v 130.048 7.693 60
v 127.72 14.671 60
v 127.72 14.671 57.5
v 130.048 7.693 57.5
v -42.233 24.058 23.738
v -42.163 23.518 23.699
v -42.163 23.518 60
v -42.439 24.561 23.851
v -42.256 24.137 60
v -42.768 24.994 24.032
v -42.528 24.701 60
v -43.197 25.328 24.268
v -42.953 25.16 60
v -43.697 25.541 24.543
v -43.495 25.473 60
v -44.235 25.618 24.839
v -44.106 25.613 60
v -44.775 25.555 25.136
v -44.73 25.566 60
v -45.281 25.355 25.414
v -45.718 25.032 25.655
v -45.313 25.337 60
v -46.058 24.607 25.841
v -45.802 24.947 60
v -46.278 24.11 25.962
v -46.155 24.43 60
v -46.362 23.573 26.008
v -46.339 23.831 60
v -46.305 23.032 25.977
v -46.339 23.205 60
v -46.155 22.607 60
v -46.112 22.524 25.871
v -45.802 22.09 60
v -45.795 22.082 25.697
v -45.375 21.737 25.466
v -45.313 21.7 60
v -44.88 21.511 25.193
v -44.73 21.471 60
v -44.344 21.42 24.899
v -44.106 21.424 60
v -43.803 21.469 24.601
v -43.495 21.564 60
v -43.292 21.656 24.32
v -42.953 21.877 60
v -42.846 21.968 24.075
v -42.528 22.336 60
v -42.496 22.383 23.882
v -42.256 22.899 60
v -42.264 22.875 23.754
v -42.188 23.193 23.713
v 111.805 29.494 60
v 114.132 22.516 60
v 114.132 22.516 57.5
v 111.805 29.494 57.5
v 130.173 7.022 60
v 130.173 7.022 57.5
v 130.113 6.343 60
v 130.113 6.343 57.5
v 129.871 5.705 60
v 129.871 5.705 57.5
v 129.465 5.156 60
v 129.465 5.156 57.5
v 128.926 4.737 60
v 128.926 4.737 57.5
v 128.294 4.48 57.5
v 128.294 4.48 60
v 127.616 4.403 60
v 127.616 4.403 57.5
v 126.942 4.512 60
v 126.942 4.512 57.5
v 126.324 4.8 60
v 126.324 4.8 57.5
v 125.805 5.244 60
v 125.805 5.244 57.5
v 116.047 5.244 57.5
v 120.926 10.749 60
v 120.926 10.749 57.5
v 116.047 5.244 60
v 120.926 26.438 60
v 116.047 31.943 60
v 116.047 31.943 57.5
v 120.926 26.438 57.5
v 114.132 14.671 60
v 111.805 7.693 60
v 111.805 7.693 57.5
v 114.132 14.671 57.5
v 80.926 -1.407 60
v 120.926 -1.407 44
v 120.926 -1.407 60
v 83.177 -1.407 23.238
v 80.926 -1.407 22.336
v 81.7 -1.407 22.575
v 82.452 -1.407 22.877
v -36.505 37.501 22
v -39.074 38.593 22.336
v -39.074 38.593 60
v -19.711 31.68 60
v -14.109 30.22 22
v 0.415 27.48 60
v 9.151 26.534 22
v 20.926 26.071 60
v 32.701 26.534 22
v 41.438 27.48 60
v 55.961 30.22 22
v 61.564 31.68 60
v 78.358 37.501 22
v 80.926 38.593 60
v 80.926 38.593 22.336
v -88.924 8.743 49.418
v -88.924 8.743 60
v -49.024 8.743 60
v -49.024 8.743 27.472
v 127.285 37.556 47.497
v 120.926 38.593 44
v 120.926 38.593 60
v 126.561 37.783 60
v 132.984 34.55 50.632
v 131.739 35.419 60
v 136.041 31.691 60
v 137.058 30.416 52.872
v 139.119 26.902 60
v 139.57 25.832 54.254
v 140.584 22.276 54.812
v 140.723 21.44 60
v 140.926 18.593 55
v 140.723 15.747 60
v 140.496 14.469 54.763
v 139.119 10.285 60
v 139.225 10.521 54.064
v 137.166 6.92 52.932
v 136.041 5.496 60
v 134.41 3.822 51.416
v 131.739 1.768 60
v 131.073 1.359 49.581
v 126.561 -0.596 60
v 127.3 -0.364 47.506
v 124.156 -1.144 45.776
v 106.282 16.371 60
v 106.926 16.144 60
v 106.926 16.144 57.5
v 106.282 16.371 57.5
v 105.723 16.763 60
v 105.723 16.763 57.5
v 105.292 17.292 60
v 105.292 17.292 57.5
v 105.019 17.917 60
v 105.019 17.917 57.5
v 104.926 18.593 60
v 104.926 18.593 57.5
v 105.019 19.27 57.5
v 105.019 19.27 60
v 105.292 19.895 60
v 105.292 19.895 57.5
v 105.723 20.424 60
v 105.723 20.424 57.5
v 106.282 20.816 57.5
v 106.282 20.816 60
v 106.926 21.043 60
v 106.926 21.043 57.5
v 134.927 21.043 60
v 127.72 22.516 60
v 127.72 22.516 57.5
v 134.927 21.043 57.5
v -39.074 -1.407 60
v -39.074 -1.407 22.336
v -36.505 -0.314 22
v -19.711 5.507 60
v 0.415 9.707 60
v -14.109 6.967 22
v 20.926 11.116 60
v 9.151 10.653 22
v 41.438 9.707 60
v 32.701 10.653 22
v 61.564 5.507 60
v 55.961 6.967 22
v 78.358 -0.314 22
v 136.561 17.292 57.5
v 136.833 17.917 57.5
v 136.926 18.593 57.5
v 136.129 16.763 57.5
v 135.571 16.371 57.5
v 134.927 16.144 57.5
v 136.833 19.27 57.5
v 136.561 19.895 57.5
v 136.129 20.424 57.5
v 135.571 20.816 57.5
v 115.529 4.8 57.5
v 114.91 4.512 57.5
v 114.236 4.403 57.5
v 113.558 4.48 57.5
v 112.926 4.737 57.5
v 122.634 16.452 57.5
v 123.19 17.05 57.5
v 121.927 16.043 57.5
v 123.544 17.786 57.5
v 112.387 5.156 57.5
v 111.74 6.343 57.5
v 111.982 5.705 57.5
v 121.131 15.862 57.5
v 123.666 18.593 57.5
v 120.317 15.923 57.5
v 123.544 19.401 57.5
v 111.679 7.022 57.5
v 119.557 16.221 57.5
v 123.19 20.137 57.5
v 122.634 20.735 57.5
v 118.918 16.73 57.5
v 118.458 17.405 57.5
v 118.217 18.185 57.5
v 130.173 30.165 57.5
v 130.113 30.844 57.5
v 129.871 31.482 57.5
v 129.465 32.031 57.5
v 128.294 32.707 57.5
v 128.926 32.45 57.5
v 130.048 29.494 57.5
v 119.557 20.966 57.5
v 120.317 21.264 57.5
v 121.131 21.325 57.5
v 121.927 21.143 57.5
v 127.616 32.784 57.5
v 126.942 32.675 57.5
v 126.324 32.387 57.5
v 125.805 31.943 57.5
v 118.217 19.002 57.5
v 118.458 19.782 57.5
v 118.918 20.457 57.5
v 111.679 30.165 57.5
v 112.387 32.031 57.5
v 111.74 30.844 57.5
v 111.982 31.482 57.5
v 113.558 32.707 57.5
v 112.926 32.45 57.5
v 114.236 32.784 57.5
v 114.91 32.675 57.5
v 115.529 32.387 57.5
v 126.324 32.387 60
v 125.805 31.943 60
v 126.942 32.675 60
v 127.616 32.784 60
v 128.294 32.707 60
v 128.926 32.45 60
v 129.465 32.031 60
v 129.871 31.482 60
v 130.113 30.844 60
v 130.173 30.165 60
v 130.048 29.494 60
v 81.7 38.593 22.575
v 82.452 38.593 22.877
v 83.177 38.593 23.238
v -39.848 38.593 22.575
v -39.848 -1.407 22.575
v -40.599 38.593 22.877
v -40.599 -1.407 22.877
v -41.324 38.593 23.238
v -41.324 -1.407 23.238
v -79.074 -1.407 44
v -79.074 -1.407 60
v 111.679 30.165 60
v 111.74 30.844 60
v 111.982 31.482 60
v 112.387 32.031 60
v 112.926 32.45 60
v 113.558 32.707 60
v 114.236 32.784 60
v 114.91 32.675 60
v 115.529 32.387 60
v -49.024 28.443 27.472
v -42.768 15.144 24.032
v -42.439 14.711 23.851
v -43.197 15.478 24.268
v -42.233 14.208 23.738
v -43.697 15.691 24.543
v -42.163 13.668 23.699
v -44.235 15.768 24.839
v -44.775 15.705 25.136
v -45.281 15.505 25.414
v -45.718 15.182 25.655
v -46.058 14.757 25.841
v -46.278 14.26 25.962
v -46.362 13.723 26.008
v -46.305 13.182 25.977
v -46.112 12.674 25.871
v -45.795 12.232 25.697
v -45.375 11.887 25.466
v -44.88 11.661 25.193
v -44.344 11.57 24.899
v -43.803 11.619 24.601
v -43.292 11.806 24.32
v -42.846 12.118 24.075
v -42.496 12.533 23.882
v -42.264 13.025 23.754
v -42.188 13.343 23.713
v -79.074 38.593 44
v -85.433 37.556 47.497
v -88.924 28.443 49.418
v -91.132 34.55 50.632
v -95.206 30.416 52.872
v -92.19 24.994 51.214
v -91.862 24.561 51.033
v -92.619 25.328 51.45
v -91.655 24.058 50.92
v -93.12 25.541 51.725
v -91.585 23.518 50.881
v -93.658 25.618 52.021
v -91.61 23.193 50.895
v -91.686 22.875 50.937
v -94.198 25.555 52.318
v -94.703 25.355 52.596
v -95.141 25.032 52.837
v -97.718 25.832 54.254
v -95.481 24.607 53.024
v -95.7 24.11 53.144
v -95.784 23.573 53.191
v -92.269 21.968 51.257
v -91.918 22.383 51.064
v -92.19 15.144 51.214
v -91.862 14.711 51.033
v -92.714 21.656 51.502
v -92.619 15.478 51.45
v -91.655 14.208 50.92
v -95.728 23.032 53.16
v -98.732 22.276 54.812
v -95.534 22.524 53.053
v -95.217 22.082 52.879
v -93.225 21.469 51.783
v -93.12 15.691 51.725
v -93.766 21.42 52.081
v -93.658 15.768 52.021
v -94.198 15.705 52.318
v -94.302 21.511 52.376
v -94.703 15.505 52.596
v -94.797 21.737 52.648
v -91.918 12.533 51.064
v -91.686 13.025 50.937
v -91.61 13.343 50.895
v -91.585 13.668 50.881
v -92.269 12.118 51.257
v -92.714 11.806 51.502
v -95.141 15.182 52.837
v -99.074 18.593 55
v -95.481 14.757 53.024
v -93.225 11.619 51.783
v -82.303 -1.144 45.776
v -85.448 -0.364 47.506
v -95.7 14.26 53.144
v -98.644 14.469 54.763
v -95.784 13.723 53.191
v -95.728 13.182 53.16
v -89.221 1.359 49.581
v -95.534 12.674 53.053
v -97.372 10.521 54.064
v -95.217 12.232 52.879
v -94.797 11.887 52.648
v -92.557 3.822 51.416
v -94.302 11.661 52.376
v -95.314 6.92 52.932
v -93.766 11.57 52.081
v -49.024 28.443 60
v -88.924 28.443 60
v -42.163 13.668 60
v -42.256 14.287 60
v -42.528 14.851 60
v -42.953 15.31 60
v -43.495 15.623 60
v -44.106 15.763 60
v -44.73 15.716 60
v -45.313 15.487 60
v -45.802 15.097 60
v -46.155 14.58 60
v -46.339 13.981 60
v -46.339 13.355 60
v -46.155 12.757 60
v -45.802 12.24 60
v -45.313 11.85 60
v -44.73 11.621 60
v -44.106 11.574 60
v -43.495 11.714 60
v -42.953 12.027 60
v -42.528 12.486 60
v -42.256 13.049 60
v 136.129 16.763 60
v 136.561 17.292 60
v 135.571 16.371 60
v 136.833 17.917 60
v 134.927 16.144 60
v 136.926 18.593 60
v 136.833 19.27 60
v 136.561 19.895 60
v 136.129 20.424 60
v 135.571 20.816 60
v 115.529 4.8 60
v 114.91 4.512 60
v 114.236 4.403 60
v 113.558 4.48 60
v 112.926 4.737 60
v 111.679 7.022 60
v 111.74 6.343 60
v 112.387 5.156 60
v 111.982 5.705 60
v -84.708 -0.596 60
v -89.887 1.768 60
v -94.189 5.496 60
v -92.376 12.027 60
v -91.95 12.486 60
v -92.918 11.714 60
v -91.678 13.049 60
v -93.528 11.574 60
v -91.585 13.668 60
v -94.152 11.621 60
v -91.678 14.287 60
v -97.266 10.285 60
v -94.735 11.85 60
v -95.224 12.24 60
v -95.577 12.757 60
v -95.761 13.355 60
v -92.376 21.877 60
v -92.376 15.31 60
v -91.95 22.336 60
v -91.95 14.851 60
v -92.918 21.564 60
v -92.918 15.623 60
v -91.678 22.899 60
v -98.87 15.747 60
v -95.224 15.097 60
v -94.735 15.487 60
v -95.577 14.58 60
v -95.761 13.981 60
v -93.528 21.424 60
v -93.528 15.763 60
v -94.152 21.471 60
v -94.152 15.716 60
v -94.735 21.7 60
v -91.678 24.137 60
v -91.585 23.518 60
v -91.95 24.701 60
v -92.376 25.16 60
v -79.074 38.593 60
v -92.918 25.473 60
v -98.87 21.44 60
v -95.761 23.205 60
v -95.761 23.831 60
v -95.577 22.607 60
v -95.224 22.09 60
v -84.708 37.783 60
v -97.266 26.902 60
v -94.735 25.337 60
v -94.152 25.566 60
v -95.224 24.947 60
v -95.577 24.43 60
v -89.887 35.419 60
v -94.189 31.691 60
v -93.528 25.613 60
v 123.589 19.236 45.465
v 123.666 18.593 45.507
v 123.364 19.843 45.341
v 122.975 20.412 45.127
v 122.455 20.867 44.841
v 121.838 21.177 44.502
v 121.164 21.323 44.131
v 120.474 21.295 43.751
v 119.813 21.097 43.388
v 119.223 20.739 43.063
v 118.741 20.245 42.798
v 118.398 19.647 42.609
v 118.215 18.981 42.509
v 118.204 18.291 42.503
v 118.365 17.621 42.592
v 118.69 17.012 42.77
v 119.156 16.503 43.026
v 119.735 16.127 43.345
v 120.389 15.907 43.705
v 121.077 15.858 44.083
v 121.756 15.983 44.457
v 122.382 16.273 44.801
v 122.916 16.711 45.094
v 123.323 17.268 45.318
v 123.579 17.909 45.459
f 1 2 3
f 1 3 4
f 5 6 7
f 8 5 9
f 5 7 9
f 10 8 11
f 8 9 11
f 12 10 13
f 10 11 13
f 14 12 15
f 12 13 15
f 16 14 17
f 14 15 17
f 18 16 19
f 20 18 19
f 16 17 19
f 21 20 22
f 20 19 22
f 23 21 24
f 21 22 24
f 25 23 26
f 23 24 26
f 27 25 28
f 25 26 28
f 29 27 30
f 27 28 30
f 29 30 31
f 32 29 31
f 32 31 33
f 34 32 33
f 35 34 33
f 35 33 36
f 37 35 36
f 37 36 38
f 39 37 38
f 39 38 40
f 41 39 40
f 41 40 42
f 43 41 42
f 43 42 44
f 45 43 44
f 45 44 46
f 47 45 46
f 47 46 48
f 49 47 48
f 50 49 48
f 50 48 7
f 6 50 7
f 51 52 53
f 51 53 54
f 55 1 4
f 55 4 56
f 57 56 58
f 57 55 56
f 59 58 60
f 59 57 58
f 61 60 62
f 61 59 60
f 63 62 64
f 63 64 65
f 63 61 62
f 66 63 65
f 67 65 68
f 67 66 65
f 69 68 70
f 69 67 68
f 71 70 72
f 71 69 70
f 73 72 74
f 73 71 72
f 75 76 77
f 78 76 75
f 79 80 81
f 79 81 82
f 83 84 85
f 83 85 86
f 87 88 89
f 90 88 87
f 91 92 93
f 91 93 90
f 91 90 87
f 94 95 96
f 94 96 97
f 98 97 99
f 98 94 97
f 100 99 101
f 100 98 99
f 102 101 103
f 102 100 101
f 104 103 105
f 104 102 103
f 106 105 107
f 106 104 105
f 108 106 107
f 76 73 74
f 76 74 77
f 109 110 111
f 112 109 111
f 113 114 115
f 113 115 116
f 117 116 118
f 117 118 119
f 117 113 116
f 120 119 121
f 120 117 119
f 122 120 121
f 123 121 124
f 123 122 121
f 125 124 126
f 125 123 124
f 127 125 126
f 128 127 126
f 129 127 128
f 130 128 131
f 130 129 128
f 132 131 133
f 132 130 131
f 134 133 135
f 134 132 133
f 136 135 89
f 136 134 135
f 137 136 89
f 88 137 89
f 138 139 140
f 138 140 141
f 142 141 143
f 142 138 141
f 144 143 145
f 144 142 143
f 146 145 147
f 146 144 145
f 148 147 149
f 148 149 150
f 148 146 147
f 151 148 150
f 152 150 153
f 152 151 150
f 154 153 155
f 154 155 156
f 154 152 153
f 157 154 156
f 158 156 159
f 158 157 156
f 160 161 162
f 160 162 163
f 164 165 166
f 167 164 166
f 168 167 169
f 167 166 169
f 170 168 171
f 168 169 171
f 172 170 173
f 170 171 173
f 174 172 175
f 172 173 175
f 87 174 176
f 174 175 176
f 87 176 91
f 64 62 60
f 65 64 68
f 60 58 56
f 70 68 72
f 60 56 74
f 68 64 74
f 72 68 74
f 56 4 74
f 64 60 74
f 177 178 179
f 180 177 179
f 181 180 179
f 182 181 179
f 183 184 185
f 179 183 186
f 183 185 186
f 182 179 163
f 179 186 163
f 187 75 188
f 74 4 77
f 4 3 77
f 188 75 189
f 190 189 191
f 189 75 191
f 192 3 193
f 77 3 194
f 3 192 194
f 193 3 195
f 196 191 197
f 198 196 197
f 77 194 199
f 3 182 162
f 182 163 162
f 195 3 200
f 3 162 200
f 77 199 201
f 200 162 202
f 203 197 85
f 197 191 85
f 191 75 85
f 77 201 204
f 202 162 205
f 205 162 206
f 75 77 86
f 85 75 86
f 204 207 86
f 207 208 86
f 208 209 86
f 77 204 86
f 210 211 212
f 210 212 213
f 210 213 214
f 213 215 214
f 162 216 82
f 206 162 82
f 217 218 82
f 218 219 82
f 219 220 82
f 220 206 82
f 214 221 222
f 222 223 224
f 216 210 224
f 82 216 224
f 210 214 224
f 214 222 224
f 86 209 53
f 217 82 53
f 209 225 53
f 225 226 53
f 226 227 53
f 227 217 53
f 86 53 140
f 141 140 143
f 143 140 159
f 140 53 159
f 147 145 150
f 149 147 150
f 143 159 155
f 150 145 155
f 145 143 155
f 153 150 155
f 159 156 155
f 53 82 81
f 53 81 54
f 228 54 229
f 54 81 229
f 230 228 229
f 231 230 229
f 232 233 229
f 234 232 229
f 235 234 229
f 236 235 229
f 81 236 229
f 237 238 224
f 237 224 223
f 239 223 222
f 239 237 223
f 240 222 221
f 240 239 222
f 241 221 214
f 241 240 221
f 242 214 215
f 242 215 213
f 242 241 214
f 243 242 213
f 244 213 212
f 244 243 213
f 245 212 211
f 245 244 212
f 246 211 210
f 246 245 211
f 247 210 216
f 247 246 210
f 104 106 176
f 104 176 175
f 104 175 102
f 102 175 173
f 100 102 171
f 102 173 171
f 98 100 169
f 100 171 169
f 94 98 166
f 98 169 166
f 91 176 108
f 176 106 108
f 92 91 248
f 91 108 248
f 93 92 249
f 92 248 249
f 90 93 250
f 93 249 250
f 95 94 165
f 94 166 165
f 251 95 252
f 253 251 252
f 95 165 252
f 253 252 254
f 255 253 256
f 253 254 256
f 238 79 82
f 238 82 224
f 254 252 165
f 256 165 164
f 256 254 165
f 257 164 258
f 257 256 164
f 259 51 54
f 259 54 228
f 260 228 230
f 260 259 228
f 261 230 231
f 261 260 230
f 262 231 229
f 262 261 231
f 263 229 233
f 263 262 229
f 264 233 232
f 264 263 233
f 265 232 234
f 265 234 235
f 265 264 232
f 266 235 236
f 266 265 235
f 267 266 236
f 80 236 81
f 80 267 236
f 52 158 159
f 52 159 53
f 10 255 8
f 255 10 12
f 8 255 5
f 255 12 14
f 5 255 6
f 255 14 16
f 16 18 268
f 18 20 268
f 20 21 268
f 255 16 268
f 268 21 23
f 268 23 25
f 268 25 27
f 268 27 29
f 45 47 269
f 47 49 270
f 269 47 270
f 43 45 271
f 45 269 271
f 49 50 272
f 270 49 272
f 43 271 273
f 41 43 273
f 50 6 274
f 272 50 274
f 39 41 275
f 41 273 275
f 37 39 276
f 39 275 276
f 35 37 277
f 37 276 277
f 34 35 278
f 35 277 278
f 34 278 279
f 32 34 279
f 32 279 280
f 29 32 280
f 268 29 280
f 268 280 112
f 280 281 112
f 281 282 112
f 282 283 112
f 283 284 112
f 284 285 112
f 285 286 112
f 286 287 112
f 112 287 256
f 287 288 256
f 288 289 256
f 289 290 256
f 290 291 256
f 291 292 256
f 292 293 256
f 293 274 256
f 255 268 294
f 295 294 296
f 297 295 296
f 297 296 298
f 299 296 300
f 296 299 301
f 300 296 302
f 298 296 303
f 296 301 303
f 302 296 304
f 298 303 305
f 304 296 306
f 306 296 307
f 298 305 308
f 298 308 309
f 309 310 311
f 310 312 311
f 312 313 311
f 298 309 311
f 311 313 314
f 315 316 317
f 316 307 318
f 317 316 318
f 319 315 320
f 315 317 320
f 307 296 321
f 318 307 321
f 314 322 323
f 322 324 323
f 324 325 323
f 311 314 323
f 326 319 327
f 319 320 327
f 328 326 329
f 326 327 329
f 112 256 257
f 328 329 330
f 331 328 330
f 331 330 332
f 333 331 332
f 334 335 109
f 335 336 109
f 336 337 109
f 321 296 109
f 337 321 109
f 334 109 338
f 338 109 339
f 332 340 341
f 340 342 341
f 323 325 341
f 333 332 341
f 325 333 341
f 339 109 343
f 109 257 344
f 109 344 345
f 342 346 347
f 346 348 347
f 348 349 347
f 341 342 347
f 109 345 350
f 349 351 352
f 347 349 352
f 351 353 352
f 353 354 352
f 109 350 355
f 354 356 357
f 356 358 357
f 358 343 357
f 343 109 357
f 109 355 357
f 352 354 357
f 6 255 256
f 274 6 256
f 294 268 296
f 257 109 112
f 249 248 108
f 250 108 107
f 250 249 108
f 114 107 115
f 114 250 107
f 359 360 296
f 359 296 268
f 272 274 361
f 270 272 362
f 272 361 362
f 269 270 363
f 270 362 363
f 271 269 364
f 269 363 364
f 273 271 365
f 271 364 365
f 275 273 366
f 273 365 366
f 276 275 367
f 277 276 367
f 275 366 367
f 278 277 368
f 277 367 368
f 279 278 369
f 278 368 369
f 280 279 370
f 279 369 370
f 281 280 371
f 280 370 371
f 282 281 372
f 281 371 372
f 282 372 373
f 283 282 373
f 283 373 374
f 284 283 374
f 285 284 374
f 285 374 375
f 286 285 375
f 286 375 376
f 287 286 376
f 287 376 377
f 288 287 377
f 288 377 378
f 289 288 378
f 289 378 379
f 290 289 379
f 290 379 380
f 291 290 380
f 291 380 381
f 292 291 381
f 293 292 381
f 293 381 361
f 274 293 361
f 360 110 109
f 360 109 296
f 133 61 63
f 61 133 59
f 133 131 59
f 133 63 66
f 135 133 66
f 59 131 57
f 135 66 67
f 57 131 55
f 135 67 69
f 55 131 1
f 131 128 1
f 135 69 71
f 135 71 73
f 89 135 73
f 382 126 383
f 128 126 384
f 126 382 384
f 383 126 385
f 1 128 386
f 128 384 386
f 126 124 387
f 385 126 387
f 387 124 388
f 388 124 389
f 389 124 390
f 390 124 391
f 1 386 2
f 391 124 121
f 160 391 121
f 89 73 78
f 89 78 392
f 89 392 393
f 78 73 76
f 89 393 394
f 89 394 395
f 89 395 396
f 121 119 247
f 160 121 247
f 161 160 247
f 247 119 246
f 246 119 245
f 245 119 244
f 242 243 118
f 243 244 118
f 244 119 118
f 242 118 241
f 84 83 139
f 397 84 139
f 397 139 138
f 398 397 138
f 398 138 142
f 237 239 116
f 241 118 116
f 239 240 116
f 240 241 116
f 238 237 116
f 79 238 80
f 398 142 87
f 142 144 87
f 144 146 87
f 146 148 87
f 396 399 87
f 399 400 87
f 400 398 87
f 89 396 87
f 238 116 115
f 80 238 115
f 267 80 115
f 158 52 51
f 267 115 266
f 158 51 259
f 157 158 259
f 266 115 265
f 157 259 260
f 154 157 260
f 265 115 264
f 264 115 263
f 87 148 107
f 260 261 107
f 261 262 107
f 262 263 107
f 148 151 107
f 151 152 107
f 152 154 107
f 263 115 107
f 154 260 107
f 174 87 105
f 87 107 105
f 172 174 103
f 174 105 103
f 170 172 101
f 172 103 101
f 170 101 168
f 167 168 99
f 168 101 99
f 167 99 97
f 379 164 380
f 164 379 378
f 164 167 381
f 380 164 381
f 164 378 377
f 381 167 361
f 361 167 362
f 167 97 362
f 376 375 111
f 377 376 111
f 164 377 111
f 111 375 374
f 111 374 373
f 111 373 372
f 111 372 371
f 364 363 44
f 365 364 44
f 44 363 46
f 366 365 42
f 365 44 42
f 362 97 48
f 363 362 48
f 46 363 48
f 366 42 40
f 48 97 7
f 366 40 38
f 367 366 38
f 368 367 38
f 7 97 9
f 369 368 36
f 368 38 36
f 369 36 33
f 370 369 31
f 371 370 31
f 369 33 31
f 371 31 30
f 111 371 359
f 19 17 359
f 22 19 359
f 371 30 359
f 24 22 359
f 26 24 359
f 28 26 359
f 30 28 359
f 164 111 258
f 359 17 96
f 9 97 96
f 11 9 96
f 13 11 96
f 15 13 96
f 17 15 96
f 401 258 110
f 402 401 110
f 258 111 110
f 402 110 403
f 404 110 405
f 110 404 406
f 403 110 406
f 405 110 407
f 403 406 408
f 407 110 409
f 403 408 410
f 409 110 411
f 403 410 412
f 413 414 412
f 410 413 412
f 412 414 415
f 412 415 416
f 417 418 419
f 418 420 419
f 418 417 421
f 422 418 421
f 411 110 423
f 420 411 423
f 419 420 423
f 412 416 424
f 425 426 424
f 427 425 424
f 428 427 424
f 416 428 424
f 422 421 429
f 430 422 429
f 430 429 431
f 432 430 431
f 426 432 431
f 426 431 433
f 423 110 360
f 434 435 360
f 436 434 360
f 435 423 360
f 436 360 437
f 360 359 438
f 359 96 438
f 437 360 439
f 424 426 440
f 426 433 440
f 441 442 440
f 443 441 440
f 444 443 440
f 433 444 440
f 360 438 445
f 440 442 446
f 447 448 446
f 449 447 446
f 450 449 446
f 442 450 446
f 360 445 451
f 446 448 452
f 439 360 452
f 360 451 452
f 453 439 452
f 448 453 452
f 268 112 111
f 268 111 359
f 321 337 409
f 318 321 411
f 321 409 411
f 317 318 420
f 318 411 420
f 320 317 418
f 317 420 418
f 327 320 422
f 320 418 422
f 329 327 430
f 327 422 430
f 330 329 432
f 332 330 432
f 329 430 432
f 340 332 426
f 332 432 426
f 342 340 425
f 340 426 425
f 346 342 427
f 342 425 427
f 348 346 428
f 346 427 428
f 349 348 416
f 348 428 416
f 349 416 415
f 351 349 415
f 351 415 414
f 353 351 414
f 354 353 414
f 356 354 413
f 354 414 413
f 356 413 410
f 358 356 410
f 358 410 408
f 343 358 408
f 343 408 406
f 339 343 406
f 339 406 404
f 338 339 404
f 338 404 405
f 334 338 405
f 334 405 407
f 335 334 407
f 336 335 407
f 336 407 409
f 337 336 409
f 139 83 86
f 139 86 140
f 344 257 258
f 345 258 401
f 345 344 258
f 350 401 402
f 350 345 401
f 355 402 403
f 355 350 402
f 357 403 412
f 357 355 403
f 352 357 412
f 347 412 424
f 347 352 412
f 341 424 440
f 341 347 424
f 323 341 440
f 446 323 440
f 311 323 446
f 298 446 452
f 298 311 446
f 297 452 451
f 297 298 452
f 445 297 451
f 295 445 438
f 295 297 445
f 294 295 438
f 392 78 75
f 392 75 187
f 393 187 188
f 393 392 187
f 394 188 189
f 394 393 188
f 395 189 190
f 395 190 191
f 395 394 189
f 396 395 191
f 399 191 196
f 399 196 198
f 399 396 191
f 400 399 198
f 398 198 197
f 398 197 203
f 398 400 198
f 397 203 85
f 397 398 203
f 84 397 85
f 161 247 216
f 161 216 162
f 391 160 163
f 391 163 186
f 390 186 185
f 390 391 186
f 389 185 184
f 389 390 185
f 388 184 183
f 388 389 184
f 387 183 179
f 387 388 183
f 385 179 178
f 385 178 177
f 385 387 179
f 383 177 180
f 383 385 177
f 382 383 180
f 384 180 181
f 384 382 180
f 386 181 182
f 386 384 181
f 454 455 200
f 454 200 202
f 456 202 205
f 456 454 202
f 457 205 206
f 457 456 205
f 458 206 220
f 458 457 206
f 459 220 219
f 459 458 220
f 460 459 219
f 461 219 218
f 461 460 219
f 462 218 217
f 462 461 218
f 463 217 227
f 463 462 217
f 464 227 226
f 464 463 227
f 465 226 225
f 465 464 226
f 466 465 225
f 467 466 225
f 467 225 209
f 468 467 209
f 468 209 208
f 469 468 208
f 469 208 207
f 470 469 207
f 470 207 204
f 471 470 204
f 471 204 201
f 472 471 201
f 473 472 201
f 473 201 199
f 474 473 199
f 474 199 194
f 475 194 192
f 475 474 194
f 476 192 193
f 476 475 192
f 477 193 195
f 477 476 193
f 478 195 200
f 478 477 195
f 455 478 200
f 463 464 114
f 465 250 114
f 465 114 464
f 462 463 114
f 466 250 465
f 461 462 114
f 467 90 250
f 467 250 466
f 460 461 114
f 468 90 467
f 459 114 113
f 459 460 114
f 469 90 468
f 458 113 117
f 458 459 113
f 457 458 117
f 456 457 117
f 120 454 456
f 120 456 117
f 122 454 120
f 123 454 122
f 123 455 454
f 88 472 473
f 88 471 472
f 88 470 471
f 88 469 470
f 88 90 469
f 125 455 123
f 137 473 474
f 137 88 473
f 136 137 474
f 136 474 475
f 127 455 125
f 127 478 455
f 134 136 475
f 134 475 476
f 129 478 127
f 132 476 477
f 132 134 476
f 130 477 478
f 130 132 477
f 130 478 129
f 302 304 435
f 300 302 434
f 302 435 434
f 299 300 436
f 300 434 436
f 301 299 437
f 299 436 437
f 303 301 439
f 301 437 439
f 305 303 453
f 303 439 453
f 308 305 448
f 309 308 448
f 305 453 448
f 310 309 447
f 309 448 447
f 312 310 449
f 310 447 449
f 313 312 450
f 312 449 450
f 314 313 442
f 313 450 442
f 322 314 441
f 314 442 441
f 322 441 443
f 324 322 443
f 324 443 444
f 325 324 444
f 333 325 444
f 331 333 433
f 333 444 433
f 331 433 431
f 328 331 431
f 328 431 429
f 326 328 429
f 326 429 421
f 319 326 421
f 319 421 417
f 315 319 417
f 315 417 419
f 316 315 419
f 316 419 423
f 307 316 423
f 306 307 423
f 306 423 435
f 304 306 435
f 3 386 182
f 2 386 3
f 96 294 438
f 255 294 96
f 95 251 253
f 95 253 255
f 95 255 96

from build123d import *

# Parameters (mm, degrees)
SKETCH1_R           = 2.73935274
BOSS_EXTRUDE1_DEPTH = 60
SKETCH16_R          = 2.1
SKETCH16_W          = 39.9
SKETCH16_H          = 19.7
CUT_EXTRUDE9_DEPTH  = 158.954623162
CUT_EXTRUDE11_DEPTH = 159.304157008
SKETCH19_W          = 123.088854382
SKETCH19_H          = 22
CUT_EXTRUDE12_DEPTH = 159.304157008
CUT_EXTRUDE14_DEPTH = 151.975703271
FILLET3_R           = 10
FILLET4_R           = 10
CUT_EXTRUDE15_DEPTH = 2.5


with BuildPart() as part:
    # Sketch1 → Boss-Extrude1 (new body)
    with BuildSketch(Plane.XY):
        with BuildLine():
            Line((-79.073756432, 38.59348199), (120.926243568, 38.59348199))
            ThreePointArc((120.926243568, 38.59348199), (140.926243568, 18.59348199), (120.926243568, -1.40651801))
            Line((120.926243568, -1.40651801), (-79.073756432, -1.40651801))
            ThreePointArc((-79.073756432, -1.40651801), (-99.073756432, 18.59348199), (-79.073756432, 38.59348199))
        make_face()
        with Locations((-79.073756432, 18.59348199)):
            Circle(SKETCH1_R, mode=Mode.SUBTRACT)
        with Locations((120.926243568, 18.59348199)):
            Circle(SKETCH1_R, mode=Mode.SUBTRACT)
    extrude(amount=BOSS_EXTRUDE1_DEPTH)

    # Sketch16 → Cut-Extrude9 (cut, through all)
    with BuildSketch(Plane.XY.offset(60)):
        with Locations((-93.68490205, 23.51848199)):
            Circle(SKETCH16_R)
        with Locations((-93.68490205, 13.66848199)):
            Circle(SKETCH16_R)
        with Locations((-44.262610814, 23.51848199)):
            Circle(SKETCH16_R)
        with Locations((-44.262610814, 13.66848199)):
            Circle(SKETCH16_R)
        with Locations((-68.973756432, 18.59348199)):
            Rectangle(SKETCH16_W, SKETCH16_H)
    extrude(amount=-CUT_EXTRUDE9_DEPTH, mode=Mode.SUBTRACT)

    # Sketch18 → Cut-Extrude11 (cut, through all)
    with BuildSketch(Plane(origin=(0, -1.40651801, 0), x_dir=(-1, 0, 0), z_dir=(0, -1, 0))):
        Polygon((-140.926243568, -55), (-140.926243568, 0), (-40.926243568, 0), align=None)
        Polygon((99.073756432, -55), (99.073756432, 0), (-0.926243568, 0), align=None)
    extrude(amount=-CUT_EXTRUDE11_DEPTH, mode=Mode.SUBTRACT)

    # Sketch19 → Cut-Extrude12 (cut, through all)
    with BuildSketch(Plane(origin=(0, -1.40651801, 0), x_dir=(-1, 0, 0), z_dir=(0, -1, 0))):
        with Locations((-19.381816377, -11)):
            Rectangle(SKETCH19_W, SKETCH19_H)
    extrude(amount=-CUT_EXTRUDE12_DEPTH, mode=Mode.SUBTRACT)

    # Sketch22 → Cut-Extrude14 (cut, through all)
    with BuildSketch(Plane(origin=(0, 0, 22), x_dir=(-1, 0, 0), z_dir=(0, 0, -1))):
        with BuildLine():
            Line((-80.926243568, 38.59348199), (39.073756432, 38.59348199))
            ThreePointArc((39.073756432, 38.59348199), (-20.926243568, 26.070752838), (-80.926243568, 38.59348199))
        make_face()
        with BuildLine():
            Line((-80.926243568, -1.40651801), (39.073756432, -1.40651801))
            ThreePointArc((39.073756432, -1.40651801), (-20.926243568, 11.116211141), (-80.926243568, -1.40651801))
        make_face()
    extrude(amount=-CUT_EXTRUDE14_DEPTH, mode=Mode.SUBTRACT)

    # Fillet3
    fillet3_edges = [part.edges().sort_by_distance(p)[0] for p in [
        (80.926243568, 18.59348199, 22),
    ]]
    fillet(fillet3_edges, radius=FILLET3_R)

    # Fillet4
    fillet4_edges = [part.edges().sort_by_distance(p)[0] for p in [
        (-39.073756432, 18.59348199, 22),
    ]]
    fillet(fillet4_edges, radius=FILLET4_R)

    # Sketch23 → Cut-Extrude15 (cut)
    with BuildSketch(Plane.XY.offset(60)):
        with BuildLine():
            Line((116.047109388, 31.94309545), (120.926243568, 26.438441465))
            Line((120.926243568, 26.438441465), (125.805377748, 31.94309545))
            ThreePointArc((125.805377748, 31.94309545), (128.926243568, 32.44988845), (130.047780865, 29.493742868))
            Line((130.047780865, 29.493742868), (127.720177765, 22.515961727))
            Line((127.720177765, 22.515961727), (134.926915045, 21.042834572))
            ThreePointArc((134.926915045, 21.042834572), (136.926243568, 18.59348199), (134.926915045, 16.144129408))
            Line((134.926915045, 16.144129408), (127.720177765, 14.671002252))
            Line((127.720177765, 14.671002252), (130.047780865, 7.693221111))
            ThreePointArc((130.047780865, 7.693221111), (128.926243568, 4.737075529), (125.805377748, 5.243868529))
            Line((125.805377748, 5.243868529), (120.926243568, 10.748522514))
            Line((120.926243568, 10.748522514), (116.047109388, 5.243868529))
            ThreePointArc((116.047109388, 5.243868529), (112.926243568, 4.737075529), (111.80470627, 7.693221111))
            Line((111.80470627, 7.693221111), (114.13230937, 14.671002252))
            Line((114.13230937, 14.671002252), (106.92557209, 16.144129408))
            ThreePointArc((106.92557209, 16.144129408), (104.926243568, 18.59348199), (106.92557209, 21.042834572))
            Line((106.92557209, 21.042834572), (114.13230937, 22.515961727))
            Line((114.13230937, 22.515961727), (111.80470627, 29.493742868))
            ThreePointArc((111.80470627, 29.493742868), (112.926243568, 32.44988845), (116.047109388, 31.94309545))
        make_face()
    extrude(amount=-CUT_EXTRUDE15_DEPTH, mode=Mode.SUBTRACT)


solid = part.part
